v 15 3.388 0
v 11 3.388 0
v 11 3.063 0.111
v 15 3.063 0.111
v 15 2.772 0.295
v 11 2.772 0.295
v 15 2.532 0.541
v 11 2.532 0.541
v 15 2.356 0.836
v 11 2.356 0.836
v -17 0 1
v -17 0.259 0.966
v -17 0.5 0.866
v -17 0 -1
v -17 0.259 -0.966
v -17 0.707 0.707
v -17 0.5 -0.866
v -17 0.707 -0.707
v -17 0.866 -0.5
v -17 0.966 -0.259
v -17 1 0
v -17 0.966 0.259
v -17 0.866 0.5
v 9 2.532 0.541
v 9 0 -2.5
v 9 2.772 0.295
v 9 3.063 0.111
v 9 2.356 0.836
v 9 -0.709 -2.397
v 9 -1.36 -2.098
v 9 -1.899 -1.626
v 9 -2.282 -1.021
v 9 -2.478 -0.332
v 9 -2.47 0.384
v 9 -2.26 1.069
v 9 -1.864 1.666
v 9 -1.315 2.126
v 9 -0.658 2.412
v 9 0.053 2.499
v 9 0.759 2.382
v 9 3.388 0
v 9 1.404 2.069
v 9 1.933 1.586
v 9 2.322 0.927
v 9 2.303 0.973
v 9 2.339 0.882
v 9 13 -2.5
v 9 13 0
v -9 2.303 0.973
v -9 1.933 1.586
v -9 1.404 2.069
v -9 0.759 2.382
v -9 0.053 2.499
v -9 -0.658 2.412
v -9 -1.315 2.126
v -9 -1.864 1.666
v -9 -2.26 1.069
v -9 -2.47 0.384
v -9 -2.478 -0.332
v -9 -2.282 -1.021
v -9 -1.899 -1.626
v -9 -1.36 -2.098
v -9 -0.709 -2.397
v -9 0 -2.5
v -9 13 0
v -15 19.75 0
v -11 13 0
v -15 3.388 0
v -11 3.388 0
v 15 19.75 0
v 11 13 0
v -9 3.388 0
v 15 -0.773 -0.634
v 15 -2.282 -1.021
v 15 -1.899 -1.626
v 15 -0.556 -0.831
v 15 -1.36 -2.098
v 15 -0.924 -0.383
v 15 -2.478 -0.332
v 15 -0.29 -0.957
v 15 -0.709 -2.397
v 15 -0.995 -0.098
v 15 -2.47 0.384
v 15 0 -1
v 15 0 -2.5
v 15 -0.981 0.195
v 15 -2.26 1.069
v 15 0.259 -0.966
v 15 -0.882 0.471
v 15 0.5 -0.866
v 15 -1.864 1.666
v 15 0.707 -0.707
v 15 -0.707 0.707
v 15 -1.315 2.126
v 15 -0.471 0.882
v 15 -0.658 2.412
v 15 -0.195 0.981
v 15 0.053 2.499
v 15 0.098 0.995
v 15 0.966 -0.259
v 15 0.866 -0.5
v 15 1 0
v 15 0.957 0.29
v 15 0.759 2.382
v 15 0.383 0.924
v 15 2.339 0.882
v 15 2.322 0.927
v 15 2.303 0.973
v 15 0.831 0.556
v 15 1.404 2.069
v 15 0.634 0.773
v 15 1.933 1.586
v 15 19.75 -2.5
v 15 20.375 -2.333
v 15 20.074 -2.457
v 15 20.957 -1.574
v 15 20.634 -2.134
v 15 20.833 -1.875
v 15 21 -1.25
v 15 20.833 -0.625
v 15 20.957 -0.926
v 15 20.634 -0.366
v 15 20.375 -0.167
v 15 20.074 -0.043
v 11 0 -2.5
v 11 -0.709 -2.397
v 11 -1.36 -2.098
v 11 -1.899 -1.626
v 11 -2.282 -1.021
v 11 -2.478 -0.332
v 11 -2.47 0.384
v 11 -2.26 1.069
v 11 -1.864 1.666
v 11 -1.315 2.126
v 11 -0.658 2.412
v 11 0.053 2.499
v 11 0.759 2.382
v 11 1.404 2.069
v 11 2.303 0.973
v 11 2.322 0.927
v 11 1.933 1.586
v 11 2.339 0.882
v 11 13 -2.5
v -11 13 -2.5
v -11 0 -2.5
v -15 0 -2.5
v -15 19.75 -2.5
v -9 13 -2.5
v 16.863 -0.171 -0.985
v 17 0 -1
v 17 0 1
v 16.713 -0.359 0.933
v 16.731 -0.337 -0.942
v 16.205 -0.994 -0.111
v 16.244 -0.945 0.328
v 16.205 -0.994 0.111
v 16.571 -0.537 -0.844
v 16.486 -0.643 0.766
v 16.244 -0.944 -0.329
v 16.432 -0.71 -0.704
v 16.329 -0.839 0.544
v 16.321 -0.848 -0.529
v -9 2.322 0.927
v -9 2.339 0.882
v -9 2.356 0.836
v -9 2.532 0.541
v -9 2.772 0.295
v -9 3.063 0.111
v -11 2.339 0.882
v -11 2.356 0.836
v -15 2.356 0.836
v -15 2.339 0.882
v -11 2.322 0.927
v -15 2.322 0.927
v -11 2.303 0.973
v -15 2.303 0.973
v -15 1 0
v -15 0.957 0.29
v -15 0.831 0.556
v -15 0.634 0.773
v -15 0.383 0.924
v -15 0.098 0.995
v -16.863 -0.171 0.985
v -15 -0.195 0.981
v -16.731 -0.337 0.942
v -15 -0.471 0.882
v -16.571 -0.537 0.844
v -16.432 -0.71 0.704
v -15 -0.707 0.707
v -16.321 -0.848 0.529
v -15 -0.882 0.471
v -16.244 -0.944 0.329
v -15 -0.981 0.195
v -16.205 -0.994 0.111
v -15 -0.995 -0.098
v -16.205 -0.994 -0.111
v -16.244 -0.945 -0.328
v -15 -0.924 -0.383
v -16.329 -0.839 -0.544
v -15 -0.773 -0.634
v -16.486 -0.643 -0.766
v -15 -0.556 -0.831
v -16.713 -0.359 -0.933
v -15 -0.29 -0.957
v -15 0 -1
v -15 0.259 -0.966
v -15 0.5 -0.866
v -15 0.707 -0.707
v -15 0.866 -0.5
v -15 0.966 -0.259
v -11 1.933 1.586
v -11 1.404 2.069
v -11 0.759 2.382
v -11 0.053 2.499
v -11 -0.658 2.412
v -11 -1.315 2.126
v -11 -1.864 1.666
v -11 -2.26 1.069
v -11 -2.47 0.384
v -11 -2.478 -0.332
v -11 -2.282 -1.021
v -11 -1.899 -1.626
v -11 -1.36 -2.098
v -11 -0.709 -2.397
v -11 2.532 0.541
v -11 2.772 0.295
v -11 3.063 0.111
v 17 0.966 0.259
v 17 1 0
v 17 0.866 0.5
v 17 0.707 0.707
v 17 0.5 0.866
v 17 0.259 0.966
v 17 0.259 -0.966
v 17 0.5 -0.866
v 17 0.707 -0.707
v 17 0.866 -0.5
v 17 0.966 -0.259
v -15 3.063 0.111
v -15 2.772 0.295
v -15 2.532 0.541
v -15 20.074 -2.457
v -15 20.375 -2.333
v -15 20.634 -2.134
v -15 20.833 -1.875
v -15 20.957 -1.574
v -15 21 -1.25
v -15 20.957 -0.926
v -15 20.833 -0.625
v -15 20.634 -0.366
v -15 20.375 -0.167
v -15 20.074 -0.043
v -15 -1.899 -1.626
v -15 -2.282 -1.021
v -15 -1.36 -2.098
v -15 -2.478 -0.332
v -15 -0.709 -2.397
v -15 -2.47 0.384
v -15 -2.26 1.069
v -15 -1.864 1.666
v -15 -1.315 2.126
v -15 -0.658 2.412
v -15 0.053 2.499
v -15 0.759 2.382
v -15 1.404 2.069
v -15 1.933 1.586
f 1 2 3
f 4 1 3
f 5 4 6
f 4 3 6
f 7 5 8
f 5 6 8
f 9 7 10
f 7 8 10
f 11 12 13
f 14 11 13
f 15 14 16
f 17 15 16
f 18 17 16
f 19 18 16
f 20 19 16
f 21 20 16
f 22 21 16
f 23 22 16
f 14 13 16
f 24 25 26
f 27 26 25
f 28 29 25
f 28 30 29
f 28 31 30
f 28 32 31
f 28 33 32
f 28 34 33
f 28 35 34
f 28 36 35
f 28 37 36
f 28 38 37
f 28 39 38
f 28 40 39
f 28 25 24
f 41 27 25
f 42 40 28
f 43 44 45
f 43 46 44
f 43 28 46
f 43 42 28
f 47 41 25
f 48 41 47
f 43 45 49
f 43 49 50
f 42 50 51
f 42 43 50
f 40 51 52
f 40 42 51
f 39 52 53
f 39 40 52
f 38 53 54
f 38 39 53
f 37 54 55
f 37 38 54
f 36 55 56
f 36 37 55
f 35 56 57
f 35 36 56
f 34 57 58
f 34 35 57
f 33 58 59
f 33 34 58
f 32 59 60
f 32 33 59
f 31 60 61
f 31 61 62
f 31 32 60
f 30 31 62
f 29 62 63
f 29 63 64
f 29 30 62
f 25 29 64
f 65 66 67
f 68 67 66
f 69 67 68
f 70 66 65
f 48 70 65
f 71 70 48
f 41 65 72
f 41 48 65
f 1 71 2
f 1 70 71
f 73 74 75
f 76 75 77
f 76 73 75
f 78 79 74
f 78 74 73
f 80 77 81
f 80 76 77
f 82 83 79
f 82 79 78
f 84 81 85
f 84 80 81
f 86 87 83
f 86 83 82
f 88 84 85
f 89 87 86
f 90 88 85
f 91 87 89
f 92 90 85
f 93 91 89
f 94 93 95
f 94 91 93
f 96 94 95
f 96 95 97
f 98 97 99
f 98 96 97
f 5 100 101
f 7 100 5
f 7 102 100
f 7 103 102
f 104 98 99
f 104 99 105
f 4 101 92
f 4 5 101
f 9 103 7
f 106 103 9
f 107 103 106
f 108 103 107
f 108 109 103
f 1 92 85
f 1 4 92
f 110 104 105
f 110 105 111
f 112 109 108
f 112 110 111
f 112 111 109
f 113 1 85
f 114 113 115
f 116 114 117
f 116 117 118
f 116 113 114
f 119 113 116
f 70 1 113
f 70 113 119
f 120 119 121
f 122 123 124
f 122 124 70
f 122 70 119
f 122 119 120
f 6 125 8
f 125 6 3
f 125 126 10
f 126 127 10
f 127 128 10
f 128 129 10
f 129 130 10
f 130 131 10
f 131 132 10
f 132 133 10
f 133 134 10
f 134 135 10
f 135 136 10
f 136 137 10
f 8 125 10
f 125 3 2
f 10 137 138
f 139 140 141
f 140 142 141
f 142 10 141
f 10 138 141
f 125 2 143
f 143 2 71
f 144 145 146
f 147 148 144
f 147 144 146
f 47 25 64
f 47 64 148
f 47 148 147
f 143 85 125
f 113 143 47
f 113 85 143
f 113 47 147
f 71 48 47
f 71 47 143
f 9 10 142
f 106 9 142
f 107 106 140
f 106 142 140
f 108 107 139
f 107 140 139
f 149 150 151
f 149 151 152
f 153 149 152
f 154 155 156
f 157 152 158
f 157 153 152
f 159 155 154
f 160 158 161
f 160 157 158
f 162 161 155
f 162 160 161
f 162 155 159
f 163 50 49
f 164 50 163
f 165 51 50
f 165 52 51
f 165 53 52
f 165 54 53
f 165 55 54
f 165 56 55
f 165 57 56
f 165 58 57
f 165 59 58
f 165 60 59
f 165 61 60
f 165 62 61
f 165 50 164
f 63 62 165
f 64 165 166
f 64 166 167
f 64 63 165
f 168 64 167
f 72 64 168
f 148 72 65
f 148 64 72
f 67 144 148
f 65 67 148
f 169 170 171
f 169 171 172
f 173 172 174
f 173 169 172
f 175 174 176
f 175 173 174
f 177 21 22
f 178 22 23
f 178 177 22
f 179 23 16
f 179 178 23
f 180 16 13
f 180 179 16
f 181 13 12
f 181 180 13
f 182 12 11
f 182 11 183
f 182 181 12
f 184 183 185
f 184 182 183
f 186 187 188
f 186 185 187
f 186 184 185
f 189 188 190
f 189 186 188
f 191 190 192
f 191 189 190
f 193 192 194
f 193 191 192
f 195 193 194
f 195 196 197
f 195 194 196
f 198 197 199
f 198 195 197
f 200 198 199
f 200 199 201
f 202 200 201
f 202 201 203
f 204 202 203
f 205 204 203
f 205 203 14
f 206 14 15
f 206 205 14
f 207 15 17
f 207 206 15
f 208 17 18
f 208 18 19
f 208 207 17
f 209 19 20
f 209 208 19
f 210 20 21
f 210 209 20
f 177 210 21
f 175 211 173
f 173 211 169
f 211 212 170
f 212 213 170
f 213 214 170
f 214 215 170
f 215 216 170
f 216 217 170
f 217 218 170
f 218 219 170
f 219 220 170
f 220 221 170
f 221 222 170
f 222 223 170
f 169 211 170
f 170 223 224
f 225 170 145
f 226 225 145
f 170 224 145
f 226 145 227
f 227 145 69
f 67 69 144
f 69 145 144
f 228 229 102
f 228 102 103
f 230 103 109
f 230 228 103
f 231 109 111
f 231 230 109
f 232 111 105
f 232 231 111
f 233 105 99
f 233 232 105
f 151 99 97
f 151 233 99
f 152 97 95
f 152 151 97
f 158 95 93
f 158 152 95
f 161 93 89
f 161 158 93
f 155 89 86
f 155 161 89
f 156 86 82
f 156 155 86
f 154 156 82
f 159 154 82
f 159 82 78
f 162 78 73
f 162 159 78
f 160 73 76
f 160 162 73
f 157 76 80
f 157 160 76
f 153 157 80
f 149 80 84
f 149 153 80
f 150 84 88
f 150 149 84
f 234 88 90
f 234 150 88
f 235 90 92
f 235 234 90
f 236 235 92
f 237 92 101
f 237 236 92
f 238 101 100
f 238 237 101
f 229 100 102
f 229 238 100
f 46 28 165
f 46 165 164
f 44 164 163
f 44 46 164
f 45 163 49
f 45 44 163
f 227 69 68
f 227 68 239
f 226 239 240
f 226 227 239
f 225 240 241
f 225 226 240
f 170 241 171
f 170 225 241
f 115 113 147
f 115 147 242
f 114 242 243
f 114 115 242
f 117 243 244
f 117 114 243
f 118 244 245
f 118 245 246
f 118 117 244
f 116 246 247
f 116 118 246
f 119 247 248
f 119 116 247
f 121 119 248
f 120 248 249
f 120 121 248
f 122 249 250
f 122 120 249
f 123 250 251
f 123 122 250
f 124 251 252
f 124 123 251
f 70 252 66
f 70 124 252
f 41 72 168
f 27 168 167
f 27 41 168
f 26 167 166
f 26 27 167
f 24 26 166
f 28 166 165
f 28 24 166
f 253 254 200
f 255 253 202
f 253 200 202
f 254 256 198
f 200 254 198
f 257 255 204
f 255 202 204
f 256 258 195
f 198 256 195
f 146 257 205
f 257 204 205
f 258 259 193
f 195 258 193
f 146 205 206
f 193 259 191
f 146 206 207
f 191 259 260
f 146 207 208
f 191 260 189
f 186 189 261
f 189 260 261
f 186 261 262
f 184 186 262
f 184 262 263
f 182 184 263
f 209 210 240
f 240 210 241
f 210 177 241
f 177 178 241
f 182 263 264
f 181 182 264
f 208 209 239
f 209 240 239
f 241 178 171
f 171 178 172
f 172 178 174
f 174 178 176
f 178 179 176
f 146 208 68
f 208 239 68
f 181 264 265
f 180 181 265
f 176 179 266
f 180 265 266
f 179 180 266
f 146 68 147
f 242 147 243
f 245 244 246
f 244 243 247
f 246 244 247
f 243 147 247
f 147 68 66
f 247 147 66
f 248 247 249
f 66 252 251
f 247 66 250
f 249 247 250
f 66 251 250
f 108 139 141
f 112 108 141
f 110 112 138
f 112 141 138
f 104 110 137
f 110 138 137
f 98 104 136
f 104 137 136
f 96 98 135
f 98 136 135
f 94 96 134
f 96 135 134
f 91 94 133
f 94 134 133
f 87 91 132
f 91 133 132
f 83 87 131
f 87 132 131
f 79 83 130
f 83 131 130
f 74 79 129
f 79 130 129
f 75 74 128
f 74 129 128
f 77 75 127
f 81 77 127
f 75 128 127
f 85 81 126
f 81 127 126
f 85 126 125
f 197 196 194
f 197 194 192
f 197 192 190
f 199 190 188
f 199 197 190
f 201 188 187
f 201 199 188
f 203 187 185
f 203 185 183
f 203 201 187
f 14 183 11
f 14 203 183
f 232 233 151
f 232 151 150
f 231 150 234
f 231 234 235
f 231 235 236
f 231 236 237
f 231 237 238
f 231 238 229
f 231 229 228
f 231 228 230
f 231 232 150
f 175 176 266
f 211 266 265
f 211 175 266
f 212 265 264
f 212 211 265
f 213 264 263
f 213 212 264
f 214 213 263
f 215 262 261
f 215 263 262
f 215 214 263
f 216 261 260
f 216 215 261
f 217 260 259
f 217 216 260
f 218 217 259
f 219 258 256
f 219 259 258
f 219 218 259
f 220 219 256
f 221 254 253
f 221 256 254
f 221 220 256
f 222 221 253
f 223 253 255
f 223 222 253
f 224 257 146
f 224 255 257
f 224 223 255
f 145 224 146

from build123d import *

# Parameters (mm, degrees)
F1_DEPTH = 15
F2_R     = 1
F3_DEPTH = 17
F5_W     = 2
F5_H     = 18.8568213596
F6_DEPTH = 12.5


with BuildPart() as f1:
    # F0 (on Right) → F1 (new body, symmetric)
    with BuildSketch(Plane.YZ):
        with BuildLine():
            Line((2.5, 0), (1, 0))
            ThreePointArc((1, 0), (0.7071067812, -0.7071067812), (0, -1))
            Line((0, -1), (0, -2.5))
            ThreePointArc((0, -2.5), (1.767766953, -1.767766953), (2.5, 0))
        make_face()
        with BuildLine():
            ThreePointArc((0, -1), (-0.7071067812, 0.7071067812), (1, 0))
            Line((1, 0), (2.5, 0))
            ThreePointArc((2.5, 0), (2.4637418621, 0.4242358271), (2.3560191704, 0.8361660533))
            ThreePointArc((2.3560191704, 0.8361660533), (2.32783074, 0.9037284298), (2.3030468589, 0.9726125467))
            ThreePointArc((2.3030468589, 0.9726125467), (-2.0834504274, 1.3817504538), (0, -2.5))
            Line((0, -2.5), (0, -1))
        make_face()
        with BuildLine():
            Line((3.3880661343, 0), (2.5, 0))
            ThreePointArc((2.5, 0), (1.767766953, -1.767766953), (0, -2.5))
            Line((0, -2.5), (19.75, -2.5))
            ThreePointArc((19.75, -2.5), (18.5, -1.25), (19.75, 0))
            Line((19.75, 0), (3.3880661343, 0))
        make_face()
        with BuildLine():
            ThreePointArc((2.3560191704, 0.8361660533), (2.4637418621, 0.4242358271), (2.5, 0))
            Line((2.5, 0), (3.3880661343, 0))
            ThreePointArc((3.3880661343, 0), (2.7720196419, 0.2946285479), (2.3560191704, 0.8361660533))
        make_face()
        with BuildLine():
            ThreePointArc((2.3030468589, 0.9726125467), (2.32783074, 0.9037284298), (2.3560191704, 0.8361660533))
            ThreePointArc((2.3560191704, 0.8361660533), (2.3305318015, 0.9047770567), (2.3030468589, 0.9726125467))
        make_face()
        with BuildLine():
            ThreePointArc((19.75, 0), (18.5, -1.25), (19.75, -2.5))
            Line((19.75, -2.5), (19.75, 0))
        make_face()
        with BuildLine():
            Line((19.75, 0), (19.75, -2.5))
            ThreePointArc((19.75, -2.5), (20.6338834765, -2.1338834765), (21, -1.25))
            ThreePointArc((21, -1.25), (20.6338834765, -0.3661165235), (19.75, 0))
        make_face()
    extrude(amount=F1_DEPTH, both=True)

    # F2 (on Right) → F3 (join, symmetric)
    with BuildSketch(Plane.YZ):
        Circle(F2_R)
    extrude(amount=F3_DEPTH, both=True)

    # F4 (on Top) + F5 (on Top) → F6 (cut, symmetric)
    with BuildSketch(Plane.XY):
        Polygon((-14.564535037, -3.0443312038), (-17, 0), (-18.738245276, 0), (-18.738245276, -3.0443312038), align=None)
        Polygon((18.738245276, -3.0443312038), (18.738245276, 0), (17, 0), (14.564535037, -3.0443312038), align=None)
    with BuildSketch(Plane.XY):
        with Locations((-10, 3.5715893202)):
            Rectangle(F5_W, F5_H)
        with Locations((10, 3.5715893202)):
            Rectangle(F5_W, F5_H)
    extrude(amount=F6_DEPTH, both=True, mode=Mode.SUBTRACT)


solid = f1.part
